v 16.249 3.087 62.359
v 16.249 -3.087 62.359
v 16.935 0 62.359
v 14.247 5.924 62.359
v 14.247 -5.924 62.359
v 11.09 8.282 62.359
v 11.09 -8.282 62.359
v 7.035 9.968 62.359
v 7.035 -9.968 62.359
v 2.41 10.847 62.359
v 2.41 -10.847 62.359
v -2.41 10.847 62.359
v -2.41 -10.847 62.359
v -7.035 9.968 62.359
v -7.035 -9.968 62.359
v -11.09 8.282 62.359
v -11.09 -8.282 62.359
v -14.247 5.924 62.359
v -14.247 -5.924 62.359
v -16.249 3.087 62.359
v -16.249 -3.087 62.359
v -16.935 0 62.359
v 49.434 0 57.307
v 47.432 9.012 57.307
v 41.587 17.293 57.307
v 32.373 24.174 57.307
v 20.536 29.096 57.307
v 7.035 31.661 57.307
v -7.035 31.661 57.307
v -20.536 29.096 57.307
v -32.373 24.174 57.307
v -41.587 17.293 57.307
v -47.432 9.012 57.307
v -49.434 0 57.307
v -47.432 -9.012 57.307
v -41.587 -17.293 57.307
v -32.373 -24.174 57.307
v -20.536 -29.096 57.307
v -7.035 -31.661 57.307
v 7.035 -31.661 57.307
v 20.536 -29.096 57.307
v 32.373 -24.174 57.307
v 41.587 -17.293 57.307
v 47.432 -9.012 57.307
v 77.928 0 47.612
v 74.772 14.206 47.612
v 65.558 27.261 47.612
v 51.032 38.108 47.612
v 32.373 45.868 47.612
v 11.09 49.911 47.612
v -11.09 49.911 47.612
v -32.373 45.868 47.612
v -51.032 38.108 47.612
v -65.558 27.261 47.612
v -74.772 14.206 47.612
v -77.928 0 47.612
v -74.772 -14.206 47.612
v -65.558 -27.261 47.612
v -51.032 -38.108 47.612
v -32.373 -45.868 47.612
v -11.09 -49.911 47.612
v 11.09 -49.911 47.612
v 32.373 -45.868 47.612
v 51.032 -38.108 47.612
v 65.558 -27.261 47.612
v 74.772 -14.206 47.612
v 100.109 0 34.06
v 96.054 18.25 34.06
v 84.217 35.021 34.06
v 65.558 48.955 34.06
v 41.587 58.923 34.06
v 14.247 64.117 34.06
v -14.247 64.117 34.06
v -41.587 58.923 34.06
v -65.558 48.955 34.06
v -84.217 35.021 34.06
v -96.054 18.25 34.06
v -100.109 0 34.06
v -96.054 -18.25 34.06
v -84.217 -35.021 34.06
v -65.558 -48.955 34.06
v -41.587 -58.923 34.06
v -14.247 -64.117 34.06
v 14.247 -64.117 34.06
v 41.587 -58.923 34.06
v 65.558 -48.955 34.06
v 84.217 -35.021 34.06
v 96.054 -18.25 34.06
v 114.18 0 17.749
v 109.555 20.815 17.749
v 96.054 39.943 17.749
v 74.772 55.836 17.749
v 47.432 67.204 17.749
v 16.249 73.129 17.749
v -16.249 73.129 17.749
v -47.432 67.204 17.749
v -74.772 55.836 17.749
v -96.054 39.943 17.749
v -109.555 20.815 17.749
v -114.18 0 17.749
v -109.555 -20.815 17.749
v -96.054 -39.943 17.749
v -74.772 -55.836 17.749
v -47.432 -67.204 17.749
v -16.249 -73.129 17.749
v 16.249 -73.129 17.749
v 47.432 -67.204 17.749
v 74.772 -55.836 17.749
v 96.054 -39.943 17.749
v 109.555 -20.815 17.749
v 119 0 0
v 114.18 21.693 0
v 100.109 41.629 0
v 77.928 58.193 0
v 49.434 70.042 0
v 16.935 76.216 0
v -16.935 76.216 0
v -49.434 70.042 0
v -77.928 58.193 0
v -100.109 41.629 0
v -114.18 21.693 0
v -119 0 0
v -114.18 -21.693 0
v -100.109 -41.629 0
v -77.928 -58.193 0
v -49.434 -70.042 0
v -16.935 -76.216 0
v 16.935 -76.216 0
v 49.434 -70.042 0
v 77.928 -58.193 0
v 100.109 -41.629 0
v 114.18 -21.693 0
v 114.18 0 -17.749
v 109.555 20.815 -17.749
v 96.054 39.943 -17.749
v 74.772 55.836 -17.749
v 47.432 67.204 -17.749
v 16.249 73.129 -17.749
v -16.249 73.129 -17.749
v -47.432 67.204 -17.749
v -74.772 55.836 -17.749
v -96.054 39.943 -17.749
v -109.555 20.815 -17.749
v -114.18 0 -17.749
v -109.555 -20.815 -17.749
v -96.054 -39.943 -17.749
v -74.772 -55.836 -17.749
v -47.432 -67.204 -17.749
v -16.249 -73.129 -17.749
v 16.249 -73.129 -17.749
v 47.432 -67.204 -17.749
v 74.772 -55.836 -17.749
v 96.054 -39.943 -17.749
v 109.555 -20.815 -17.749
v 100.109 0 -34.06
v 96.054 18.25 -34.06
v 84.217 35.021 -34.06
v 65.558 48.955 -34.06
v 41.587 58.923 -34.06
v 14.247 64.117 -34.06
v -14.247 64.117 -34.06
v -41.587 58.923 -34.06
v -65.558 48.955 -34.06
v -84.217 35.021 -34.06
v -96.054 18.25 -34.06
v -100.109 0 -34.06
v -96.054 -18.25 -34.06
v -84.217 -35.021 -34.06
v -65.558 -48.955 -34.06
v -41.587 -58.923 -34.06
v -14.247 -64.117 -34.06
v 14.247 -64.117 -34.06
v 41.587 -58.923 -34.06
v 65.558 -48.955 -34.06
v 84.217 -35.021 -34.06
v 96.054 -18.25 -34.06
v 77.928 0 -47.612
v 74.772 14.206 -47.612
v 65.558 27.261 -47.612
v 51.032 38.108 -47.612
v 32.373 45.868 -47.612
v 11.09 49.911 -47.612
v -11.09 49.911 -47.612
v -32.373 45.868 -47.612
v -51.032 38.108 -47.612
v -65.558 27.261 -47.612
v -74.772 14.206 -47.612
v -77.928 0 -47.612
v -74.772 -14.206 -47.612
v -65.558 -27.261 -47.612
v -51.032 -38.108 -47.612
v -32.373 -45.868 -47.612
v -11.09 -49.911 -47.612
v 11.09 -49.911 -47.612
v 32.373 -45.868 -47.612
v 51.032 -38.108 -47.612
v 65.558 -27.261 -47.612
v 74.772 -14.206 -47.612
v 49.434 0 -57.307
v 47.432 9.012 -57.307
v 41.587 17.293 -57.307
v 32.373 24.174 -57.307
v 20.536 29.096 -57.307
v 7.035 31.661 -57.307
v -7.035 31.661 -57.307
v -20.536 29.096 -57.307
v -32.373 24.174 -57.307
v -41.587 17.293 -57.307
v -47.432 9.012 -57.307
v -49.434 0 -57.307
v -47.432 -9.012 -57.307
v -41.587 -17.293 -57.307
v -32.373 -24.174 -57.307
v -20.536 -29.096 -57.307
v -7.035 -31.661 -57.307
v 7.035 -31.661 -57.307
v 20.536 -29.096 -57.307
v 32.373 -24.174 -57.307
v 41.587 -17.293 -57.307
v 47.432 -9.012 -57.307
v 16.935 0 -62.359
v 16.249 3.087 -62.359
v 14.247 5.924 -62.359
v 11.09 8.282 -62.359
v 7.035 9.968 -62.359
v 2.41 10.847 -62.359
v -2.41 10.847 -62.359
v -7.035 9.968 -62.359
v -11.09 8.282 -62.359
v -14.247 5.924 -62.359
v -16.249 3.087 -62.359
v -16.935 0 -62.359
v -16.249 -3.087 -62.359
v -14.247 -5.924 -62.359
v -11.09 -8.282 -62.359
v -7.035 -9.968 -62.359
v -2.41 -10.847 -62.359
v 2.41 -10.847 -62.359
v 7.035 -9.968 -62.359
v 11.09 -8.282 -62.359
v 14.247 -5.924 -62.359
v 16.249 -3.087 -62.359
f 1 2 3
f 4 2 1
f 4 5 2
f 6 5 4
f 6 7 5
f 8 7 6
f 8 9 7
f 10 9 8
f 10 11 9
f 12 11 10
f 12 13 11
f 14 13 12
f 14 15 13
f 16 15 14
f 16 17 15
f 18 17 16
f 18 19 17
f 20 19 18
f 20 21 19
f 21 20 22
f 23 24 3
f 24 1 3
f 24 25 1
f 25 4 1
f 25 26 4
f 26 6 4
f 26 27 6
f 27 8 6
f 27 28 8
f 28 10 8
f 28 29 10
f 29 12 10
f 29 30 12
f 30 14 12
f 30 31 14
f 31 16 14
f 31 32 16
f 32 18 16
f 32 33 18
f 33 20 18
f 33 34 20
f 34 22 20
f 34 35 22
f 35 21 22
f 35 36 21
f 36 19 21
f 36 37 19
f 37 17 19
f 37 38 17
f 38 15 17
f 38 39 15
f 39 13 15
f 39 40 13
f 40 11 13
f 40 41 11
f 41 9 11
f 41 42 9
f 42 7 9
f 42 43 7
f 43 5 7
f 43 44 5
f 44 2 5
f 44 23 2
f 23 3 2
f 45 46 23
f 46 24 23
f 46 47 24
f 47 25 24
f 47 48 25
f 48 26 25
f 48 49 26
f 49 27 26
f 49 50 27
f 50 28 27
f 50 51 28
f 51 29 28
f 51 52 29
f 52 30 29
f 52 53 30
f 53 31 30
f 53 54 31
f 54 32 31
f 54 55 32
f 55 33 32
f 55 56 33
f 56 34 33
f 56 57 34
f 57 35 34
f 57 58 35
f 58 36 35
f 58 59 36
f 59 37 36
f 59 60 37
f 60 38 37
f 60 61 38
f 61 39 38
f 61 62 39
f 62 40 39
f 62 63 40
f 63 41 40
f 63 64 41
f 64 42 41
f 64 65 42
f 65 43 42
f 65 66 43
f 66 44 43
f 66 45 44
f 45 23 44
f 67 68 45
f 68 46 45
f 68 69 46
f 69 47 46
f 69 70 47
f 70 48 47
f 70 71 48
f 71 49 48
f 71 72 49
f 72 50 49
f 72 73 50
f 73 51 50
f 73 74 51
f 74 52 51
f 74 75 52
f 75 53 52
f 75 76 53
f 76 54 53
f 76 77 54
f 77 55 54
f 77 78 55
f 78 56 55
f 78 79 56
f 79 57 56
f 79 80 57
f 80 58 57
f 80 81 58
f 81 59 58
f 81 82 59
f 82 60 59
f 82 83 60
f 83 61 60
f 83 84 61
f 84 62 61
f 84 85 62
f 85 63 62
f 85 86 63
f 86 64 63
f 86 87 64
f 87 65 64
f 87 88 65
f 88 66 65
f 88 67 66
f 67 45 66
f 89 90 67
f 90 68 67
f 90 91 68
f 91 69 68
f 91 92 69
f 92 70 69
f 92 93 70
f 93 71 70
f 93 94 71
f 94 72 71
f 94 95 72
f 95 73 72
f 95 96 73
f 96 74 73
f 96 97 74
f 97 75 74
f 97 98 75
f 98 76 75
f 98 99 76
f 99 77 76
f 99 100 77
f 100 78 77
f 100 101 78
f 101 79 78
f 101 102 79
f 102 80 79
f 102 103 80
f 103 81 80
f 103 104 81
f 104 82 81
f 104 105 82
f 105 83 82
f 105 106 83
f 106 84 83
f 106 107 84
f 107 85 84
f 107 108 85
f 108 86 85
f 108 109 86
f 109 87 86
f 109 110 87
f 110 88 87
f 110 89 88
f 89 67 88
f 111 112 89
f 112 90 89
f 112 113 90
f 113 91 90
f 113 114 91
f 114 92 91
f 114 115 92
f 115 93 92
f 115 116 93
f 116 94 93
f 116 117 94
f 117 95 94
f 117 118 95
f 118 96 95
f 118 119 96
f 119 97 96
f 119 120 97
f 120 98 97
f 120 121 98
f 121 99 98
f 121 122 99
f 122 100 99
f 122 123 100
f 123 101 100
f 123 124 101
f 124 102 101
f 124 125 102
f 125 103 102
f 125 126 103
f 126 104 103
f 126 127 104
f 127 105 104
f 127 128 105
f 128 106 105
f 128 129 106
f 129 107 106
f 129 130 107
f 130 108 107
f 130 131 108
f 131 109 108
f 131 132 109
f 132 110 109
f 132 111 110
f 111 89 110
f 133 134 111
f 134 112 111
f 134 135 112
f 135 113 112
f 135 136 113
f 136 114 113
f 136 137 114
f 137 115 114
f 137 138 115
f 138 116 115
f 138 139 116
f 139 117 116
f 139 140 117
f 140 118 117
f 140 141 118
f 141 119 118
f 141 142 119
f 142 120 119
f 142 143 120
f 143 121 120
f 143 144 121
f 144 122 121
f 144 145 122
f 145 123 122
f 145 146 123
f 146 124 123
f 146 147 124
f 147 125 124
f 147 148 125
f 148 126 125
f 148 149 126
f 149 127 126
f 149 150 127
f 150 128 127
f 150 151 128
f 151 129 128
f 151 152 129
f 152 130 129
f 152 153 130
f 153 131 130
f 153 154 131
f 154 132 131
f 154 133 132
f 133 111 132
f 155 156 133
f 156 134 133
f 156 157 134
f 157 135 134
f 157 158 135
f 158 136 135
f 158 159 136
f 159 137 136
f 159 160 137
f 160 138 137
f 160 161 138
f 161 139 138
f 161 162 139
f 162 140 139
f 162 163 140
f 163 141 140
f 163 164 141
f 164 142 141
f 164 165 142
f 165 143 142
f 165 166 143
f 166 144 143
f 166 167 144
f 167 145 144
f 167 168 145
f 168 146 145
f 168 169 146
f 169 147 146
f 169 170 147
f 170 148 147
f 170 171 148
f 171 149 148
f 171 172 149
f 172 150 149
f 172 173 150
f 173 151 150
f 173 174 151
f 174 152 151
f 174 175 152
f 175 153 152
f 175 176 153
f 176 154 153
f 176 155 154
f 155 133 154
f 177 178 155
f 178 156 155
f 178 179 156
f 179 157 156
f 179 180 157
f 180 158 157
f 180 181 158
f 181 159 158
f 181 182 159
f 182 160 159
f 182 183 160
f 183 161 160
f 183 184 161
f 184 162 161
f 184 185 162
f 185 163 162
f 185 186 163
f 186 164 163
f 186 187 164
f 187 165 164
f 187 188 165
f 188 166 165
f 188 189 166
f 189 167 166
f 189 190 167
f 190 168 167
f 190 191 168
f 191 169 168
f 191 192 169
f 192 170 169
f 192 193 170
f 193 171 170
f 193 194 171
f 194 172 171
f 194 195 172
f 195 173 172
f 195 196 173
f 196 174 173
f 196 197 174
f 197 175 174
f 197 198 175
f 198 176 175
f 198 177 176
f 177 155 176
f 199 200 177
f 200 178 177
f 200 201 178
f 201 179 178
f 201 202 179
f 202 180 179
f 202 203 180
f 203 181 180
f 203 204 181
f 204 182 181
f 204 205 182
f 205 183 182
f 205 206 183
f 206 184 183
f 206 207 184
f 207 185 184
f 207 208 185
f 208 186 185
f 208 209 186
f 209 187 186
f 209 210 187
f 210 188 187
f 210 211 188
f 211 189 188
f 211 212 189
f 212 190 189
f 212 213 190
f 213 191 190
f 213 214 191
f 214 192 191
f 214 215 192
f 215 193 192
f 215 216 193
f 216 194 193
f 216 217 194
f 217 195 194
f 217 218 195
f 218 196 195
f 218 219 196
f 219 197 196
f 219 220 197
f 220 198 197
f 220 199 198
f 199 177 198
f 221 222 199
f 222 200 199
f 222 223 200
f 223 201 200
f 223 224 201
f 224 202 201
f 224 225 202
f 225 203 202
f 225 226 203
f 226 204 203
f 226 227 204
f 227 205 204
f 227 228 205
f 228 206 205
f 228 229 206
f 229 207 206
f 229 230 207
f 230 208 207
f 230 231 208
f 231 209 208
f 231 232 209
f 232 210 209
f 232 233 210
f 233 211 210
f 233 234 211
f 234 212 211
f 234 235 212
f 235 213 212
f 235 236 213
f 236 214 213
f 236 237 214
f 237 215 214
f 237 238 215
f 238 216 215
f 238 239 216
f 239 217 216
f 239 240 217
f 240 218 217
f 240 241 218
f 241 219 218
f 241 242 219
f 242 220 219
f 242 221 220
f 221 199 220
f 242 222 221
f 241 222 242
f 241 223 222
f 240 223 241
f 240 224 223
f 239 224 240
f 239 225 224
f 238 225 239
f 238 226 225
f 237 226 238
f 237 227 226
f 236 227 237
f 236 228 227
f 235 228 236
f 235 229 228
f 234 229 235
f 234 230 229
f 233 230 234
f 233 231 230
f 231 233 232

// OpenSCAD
// Generated by SolidPython 1.0.1 on 2020-07-29 00:46:53


scale(v = [17, 11, 9]) {
	sphere(r = 7);
}
/***********************************************
*********      SolidPython code:      **********
************************************************
 
# import packages: SolidPython
from solid import *
from solid.utils import *
from itertools import chain, combinations, permutations


class Resize:

    def __init__(self, scad_file):
        self.scad_file = scad_file
        #self.scad_file = import_scad(scad_file)
        # cone/cylinder param:
        self.r1 = 0
        self.r2 = 0
        self.h = 0
        # rectangular prism param:
        self.w = 0
        self.l = 0
        # ellipse param:
        self.r = 0

    # import OpenScad code (file name corresponds to shape)


    # classify shape + parameters
    def assign(self, param1, param2, param3):
        if self.scad_file == 'cone.scad':
            self.r1 = param1
            self.r2 = param2
            self.h = param3
        elif self.scad_file == 'cylinder.scad':
            self.r1 = param1
            self.r2 = param2
            self.h = param3
        elif self.scad_file == 'rectangularPrism.scad':
            self.h = param1
            self.l = param2
            self.w = param3
        else:
            self.r = param1
            self.h = param2

    # resize parameters
    def iterate(self):
        x = range(3, 20, 2)
        i = 1
        if self.scad_file == 'cone.scad':
            tempList = list(permutations(x, 2))
            for temp in tempList:
                param1 = temp[0]
                param2 = temp[1]
                filepath = 'produced_scad_files/' + 'cone' + str(param1) + '_' + str(param2) + '_' + '.scad'
                scad_render_to_file(cylinder(h=param1, r1=param2, r2=0), filepath)

        elif self.scad_file == 'cylinder.scad':
            tempList = list(permutations(x, 3))
            for temp in tempList:
                param1 = temp[0]
                param2 = temp[1]
                filepath = 'produced_scad_files/' + 'cylinder' + str(param1) + '_' + str(param2) + '_' + '.scad'
                scad_render_to_file(cylinder(h=param1, r1=param2, r2=param2), filepath)

        elif self.scad_file == 'rectangularPrism.scad':
            tempList = list(permutations(x, 3))
            for temp in tempList:
                param1 = temp[0]
                param2 = temp[1]
                param3 = temp[2]
                filepath = 'produced_scad_files/' + 'rectangularPrism' + str(param1) + '_' + str(param2) + '_' + str(
                    param3) + '.scad'
                scad_render_to_file(cube(size=(param1, param2, param3)), filepath)

        elif self.scad_file == 'ellipse.scad':
            tempList = list(permutations(x, 4))
            for temp in tempList:
                param1 = temp[0]
                param2 = temp[1]
                param3 = temp[2]
                param4 = temp[3]
                filepath = 'produced_scad_files/' + 'ellipse' + str(param1) + '_' + str(param2) + '_' + str(param3) + '_' + str(param4) + '.scad'
                scad_render_to_file(scale([param1, param2, param3])(sphere(r=param4)), filepath)

    def render_to_scadfile(self):
        scad_render_to_file(scad, 'example.scad') 
 
************************************************/
